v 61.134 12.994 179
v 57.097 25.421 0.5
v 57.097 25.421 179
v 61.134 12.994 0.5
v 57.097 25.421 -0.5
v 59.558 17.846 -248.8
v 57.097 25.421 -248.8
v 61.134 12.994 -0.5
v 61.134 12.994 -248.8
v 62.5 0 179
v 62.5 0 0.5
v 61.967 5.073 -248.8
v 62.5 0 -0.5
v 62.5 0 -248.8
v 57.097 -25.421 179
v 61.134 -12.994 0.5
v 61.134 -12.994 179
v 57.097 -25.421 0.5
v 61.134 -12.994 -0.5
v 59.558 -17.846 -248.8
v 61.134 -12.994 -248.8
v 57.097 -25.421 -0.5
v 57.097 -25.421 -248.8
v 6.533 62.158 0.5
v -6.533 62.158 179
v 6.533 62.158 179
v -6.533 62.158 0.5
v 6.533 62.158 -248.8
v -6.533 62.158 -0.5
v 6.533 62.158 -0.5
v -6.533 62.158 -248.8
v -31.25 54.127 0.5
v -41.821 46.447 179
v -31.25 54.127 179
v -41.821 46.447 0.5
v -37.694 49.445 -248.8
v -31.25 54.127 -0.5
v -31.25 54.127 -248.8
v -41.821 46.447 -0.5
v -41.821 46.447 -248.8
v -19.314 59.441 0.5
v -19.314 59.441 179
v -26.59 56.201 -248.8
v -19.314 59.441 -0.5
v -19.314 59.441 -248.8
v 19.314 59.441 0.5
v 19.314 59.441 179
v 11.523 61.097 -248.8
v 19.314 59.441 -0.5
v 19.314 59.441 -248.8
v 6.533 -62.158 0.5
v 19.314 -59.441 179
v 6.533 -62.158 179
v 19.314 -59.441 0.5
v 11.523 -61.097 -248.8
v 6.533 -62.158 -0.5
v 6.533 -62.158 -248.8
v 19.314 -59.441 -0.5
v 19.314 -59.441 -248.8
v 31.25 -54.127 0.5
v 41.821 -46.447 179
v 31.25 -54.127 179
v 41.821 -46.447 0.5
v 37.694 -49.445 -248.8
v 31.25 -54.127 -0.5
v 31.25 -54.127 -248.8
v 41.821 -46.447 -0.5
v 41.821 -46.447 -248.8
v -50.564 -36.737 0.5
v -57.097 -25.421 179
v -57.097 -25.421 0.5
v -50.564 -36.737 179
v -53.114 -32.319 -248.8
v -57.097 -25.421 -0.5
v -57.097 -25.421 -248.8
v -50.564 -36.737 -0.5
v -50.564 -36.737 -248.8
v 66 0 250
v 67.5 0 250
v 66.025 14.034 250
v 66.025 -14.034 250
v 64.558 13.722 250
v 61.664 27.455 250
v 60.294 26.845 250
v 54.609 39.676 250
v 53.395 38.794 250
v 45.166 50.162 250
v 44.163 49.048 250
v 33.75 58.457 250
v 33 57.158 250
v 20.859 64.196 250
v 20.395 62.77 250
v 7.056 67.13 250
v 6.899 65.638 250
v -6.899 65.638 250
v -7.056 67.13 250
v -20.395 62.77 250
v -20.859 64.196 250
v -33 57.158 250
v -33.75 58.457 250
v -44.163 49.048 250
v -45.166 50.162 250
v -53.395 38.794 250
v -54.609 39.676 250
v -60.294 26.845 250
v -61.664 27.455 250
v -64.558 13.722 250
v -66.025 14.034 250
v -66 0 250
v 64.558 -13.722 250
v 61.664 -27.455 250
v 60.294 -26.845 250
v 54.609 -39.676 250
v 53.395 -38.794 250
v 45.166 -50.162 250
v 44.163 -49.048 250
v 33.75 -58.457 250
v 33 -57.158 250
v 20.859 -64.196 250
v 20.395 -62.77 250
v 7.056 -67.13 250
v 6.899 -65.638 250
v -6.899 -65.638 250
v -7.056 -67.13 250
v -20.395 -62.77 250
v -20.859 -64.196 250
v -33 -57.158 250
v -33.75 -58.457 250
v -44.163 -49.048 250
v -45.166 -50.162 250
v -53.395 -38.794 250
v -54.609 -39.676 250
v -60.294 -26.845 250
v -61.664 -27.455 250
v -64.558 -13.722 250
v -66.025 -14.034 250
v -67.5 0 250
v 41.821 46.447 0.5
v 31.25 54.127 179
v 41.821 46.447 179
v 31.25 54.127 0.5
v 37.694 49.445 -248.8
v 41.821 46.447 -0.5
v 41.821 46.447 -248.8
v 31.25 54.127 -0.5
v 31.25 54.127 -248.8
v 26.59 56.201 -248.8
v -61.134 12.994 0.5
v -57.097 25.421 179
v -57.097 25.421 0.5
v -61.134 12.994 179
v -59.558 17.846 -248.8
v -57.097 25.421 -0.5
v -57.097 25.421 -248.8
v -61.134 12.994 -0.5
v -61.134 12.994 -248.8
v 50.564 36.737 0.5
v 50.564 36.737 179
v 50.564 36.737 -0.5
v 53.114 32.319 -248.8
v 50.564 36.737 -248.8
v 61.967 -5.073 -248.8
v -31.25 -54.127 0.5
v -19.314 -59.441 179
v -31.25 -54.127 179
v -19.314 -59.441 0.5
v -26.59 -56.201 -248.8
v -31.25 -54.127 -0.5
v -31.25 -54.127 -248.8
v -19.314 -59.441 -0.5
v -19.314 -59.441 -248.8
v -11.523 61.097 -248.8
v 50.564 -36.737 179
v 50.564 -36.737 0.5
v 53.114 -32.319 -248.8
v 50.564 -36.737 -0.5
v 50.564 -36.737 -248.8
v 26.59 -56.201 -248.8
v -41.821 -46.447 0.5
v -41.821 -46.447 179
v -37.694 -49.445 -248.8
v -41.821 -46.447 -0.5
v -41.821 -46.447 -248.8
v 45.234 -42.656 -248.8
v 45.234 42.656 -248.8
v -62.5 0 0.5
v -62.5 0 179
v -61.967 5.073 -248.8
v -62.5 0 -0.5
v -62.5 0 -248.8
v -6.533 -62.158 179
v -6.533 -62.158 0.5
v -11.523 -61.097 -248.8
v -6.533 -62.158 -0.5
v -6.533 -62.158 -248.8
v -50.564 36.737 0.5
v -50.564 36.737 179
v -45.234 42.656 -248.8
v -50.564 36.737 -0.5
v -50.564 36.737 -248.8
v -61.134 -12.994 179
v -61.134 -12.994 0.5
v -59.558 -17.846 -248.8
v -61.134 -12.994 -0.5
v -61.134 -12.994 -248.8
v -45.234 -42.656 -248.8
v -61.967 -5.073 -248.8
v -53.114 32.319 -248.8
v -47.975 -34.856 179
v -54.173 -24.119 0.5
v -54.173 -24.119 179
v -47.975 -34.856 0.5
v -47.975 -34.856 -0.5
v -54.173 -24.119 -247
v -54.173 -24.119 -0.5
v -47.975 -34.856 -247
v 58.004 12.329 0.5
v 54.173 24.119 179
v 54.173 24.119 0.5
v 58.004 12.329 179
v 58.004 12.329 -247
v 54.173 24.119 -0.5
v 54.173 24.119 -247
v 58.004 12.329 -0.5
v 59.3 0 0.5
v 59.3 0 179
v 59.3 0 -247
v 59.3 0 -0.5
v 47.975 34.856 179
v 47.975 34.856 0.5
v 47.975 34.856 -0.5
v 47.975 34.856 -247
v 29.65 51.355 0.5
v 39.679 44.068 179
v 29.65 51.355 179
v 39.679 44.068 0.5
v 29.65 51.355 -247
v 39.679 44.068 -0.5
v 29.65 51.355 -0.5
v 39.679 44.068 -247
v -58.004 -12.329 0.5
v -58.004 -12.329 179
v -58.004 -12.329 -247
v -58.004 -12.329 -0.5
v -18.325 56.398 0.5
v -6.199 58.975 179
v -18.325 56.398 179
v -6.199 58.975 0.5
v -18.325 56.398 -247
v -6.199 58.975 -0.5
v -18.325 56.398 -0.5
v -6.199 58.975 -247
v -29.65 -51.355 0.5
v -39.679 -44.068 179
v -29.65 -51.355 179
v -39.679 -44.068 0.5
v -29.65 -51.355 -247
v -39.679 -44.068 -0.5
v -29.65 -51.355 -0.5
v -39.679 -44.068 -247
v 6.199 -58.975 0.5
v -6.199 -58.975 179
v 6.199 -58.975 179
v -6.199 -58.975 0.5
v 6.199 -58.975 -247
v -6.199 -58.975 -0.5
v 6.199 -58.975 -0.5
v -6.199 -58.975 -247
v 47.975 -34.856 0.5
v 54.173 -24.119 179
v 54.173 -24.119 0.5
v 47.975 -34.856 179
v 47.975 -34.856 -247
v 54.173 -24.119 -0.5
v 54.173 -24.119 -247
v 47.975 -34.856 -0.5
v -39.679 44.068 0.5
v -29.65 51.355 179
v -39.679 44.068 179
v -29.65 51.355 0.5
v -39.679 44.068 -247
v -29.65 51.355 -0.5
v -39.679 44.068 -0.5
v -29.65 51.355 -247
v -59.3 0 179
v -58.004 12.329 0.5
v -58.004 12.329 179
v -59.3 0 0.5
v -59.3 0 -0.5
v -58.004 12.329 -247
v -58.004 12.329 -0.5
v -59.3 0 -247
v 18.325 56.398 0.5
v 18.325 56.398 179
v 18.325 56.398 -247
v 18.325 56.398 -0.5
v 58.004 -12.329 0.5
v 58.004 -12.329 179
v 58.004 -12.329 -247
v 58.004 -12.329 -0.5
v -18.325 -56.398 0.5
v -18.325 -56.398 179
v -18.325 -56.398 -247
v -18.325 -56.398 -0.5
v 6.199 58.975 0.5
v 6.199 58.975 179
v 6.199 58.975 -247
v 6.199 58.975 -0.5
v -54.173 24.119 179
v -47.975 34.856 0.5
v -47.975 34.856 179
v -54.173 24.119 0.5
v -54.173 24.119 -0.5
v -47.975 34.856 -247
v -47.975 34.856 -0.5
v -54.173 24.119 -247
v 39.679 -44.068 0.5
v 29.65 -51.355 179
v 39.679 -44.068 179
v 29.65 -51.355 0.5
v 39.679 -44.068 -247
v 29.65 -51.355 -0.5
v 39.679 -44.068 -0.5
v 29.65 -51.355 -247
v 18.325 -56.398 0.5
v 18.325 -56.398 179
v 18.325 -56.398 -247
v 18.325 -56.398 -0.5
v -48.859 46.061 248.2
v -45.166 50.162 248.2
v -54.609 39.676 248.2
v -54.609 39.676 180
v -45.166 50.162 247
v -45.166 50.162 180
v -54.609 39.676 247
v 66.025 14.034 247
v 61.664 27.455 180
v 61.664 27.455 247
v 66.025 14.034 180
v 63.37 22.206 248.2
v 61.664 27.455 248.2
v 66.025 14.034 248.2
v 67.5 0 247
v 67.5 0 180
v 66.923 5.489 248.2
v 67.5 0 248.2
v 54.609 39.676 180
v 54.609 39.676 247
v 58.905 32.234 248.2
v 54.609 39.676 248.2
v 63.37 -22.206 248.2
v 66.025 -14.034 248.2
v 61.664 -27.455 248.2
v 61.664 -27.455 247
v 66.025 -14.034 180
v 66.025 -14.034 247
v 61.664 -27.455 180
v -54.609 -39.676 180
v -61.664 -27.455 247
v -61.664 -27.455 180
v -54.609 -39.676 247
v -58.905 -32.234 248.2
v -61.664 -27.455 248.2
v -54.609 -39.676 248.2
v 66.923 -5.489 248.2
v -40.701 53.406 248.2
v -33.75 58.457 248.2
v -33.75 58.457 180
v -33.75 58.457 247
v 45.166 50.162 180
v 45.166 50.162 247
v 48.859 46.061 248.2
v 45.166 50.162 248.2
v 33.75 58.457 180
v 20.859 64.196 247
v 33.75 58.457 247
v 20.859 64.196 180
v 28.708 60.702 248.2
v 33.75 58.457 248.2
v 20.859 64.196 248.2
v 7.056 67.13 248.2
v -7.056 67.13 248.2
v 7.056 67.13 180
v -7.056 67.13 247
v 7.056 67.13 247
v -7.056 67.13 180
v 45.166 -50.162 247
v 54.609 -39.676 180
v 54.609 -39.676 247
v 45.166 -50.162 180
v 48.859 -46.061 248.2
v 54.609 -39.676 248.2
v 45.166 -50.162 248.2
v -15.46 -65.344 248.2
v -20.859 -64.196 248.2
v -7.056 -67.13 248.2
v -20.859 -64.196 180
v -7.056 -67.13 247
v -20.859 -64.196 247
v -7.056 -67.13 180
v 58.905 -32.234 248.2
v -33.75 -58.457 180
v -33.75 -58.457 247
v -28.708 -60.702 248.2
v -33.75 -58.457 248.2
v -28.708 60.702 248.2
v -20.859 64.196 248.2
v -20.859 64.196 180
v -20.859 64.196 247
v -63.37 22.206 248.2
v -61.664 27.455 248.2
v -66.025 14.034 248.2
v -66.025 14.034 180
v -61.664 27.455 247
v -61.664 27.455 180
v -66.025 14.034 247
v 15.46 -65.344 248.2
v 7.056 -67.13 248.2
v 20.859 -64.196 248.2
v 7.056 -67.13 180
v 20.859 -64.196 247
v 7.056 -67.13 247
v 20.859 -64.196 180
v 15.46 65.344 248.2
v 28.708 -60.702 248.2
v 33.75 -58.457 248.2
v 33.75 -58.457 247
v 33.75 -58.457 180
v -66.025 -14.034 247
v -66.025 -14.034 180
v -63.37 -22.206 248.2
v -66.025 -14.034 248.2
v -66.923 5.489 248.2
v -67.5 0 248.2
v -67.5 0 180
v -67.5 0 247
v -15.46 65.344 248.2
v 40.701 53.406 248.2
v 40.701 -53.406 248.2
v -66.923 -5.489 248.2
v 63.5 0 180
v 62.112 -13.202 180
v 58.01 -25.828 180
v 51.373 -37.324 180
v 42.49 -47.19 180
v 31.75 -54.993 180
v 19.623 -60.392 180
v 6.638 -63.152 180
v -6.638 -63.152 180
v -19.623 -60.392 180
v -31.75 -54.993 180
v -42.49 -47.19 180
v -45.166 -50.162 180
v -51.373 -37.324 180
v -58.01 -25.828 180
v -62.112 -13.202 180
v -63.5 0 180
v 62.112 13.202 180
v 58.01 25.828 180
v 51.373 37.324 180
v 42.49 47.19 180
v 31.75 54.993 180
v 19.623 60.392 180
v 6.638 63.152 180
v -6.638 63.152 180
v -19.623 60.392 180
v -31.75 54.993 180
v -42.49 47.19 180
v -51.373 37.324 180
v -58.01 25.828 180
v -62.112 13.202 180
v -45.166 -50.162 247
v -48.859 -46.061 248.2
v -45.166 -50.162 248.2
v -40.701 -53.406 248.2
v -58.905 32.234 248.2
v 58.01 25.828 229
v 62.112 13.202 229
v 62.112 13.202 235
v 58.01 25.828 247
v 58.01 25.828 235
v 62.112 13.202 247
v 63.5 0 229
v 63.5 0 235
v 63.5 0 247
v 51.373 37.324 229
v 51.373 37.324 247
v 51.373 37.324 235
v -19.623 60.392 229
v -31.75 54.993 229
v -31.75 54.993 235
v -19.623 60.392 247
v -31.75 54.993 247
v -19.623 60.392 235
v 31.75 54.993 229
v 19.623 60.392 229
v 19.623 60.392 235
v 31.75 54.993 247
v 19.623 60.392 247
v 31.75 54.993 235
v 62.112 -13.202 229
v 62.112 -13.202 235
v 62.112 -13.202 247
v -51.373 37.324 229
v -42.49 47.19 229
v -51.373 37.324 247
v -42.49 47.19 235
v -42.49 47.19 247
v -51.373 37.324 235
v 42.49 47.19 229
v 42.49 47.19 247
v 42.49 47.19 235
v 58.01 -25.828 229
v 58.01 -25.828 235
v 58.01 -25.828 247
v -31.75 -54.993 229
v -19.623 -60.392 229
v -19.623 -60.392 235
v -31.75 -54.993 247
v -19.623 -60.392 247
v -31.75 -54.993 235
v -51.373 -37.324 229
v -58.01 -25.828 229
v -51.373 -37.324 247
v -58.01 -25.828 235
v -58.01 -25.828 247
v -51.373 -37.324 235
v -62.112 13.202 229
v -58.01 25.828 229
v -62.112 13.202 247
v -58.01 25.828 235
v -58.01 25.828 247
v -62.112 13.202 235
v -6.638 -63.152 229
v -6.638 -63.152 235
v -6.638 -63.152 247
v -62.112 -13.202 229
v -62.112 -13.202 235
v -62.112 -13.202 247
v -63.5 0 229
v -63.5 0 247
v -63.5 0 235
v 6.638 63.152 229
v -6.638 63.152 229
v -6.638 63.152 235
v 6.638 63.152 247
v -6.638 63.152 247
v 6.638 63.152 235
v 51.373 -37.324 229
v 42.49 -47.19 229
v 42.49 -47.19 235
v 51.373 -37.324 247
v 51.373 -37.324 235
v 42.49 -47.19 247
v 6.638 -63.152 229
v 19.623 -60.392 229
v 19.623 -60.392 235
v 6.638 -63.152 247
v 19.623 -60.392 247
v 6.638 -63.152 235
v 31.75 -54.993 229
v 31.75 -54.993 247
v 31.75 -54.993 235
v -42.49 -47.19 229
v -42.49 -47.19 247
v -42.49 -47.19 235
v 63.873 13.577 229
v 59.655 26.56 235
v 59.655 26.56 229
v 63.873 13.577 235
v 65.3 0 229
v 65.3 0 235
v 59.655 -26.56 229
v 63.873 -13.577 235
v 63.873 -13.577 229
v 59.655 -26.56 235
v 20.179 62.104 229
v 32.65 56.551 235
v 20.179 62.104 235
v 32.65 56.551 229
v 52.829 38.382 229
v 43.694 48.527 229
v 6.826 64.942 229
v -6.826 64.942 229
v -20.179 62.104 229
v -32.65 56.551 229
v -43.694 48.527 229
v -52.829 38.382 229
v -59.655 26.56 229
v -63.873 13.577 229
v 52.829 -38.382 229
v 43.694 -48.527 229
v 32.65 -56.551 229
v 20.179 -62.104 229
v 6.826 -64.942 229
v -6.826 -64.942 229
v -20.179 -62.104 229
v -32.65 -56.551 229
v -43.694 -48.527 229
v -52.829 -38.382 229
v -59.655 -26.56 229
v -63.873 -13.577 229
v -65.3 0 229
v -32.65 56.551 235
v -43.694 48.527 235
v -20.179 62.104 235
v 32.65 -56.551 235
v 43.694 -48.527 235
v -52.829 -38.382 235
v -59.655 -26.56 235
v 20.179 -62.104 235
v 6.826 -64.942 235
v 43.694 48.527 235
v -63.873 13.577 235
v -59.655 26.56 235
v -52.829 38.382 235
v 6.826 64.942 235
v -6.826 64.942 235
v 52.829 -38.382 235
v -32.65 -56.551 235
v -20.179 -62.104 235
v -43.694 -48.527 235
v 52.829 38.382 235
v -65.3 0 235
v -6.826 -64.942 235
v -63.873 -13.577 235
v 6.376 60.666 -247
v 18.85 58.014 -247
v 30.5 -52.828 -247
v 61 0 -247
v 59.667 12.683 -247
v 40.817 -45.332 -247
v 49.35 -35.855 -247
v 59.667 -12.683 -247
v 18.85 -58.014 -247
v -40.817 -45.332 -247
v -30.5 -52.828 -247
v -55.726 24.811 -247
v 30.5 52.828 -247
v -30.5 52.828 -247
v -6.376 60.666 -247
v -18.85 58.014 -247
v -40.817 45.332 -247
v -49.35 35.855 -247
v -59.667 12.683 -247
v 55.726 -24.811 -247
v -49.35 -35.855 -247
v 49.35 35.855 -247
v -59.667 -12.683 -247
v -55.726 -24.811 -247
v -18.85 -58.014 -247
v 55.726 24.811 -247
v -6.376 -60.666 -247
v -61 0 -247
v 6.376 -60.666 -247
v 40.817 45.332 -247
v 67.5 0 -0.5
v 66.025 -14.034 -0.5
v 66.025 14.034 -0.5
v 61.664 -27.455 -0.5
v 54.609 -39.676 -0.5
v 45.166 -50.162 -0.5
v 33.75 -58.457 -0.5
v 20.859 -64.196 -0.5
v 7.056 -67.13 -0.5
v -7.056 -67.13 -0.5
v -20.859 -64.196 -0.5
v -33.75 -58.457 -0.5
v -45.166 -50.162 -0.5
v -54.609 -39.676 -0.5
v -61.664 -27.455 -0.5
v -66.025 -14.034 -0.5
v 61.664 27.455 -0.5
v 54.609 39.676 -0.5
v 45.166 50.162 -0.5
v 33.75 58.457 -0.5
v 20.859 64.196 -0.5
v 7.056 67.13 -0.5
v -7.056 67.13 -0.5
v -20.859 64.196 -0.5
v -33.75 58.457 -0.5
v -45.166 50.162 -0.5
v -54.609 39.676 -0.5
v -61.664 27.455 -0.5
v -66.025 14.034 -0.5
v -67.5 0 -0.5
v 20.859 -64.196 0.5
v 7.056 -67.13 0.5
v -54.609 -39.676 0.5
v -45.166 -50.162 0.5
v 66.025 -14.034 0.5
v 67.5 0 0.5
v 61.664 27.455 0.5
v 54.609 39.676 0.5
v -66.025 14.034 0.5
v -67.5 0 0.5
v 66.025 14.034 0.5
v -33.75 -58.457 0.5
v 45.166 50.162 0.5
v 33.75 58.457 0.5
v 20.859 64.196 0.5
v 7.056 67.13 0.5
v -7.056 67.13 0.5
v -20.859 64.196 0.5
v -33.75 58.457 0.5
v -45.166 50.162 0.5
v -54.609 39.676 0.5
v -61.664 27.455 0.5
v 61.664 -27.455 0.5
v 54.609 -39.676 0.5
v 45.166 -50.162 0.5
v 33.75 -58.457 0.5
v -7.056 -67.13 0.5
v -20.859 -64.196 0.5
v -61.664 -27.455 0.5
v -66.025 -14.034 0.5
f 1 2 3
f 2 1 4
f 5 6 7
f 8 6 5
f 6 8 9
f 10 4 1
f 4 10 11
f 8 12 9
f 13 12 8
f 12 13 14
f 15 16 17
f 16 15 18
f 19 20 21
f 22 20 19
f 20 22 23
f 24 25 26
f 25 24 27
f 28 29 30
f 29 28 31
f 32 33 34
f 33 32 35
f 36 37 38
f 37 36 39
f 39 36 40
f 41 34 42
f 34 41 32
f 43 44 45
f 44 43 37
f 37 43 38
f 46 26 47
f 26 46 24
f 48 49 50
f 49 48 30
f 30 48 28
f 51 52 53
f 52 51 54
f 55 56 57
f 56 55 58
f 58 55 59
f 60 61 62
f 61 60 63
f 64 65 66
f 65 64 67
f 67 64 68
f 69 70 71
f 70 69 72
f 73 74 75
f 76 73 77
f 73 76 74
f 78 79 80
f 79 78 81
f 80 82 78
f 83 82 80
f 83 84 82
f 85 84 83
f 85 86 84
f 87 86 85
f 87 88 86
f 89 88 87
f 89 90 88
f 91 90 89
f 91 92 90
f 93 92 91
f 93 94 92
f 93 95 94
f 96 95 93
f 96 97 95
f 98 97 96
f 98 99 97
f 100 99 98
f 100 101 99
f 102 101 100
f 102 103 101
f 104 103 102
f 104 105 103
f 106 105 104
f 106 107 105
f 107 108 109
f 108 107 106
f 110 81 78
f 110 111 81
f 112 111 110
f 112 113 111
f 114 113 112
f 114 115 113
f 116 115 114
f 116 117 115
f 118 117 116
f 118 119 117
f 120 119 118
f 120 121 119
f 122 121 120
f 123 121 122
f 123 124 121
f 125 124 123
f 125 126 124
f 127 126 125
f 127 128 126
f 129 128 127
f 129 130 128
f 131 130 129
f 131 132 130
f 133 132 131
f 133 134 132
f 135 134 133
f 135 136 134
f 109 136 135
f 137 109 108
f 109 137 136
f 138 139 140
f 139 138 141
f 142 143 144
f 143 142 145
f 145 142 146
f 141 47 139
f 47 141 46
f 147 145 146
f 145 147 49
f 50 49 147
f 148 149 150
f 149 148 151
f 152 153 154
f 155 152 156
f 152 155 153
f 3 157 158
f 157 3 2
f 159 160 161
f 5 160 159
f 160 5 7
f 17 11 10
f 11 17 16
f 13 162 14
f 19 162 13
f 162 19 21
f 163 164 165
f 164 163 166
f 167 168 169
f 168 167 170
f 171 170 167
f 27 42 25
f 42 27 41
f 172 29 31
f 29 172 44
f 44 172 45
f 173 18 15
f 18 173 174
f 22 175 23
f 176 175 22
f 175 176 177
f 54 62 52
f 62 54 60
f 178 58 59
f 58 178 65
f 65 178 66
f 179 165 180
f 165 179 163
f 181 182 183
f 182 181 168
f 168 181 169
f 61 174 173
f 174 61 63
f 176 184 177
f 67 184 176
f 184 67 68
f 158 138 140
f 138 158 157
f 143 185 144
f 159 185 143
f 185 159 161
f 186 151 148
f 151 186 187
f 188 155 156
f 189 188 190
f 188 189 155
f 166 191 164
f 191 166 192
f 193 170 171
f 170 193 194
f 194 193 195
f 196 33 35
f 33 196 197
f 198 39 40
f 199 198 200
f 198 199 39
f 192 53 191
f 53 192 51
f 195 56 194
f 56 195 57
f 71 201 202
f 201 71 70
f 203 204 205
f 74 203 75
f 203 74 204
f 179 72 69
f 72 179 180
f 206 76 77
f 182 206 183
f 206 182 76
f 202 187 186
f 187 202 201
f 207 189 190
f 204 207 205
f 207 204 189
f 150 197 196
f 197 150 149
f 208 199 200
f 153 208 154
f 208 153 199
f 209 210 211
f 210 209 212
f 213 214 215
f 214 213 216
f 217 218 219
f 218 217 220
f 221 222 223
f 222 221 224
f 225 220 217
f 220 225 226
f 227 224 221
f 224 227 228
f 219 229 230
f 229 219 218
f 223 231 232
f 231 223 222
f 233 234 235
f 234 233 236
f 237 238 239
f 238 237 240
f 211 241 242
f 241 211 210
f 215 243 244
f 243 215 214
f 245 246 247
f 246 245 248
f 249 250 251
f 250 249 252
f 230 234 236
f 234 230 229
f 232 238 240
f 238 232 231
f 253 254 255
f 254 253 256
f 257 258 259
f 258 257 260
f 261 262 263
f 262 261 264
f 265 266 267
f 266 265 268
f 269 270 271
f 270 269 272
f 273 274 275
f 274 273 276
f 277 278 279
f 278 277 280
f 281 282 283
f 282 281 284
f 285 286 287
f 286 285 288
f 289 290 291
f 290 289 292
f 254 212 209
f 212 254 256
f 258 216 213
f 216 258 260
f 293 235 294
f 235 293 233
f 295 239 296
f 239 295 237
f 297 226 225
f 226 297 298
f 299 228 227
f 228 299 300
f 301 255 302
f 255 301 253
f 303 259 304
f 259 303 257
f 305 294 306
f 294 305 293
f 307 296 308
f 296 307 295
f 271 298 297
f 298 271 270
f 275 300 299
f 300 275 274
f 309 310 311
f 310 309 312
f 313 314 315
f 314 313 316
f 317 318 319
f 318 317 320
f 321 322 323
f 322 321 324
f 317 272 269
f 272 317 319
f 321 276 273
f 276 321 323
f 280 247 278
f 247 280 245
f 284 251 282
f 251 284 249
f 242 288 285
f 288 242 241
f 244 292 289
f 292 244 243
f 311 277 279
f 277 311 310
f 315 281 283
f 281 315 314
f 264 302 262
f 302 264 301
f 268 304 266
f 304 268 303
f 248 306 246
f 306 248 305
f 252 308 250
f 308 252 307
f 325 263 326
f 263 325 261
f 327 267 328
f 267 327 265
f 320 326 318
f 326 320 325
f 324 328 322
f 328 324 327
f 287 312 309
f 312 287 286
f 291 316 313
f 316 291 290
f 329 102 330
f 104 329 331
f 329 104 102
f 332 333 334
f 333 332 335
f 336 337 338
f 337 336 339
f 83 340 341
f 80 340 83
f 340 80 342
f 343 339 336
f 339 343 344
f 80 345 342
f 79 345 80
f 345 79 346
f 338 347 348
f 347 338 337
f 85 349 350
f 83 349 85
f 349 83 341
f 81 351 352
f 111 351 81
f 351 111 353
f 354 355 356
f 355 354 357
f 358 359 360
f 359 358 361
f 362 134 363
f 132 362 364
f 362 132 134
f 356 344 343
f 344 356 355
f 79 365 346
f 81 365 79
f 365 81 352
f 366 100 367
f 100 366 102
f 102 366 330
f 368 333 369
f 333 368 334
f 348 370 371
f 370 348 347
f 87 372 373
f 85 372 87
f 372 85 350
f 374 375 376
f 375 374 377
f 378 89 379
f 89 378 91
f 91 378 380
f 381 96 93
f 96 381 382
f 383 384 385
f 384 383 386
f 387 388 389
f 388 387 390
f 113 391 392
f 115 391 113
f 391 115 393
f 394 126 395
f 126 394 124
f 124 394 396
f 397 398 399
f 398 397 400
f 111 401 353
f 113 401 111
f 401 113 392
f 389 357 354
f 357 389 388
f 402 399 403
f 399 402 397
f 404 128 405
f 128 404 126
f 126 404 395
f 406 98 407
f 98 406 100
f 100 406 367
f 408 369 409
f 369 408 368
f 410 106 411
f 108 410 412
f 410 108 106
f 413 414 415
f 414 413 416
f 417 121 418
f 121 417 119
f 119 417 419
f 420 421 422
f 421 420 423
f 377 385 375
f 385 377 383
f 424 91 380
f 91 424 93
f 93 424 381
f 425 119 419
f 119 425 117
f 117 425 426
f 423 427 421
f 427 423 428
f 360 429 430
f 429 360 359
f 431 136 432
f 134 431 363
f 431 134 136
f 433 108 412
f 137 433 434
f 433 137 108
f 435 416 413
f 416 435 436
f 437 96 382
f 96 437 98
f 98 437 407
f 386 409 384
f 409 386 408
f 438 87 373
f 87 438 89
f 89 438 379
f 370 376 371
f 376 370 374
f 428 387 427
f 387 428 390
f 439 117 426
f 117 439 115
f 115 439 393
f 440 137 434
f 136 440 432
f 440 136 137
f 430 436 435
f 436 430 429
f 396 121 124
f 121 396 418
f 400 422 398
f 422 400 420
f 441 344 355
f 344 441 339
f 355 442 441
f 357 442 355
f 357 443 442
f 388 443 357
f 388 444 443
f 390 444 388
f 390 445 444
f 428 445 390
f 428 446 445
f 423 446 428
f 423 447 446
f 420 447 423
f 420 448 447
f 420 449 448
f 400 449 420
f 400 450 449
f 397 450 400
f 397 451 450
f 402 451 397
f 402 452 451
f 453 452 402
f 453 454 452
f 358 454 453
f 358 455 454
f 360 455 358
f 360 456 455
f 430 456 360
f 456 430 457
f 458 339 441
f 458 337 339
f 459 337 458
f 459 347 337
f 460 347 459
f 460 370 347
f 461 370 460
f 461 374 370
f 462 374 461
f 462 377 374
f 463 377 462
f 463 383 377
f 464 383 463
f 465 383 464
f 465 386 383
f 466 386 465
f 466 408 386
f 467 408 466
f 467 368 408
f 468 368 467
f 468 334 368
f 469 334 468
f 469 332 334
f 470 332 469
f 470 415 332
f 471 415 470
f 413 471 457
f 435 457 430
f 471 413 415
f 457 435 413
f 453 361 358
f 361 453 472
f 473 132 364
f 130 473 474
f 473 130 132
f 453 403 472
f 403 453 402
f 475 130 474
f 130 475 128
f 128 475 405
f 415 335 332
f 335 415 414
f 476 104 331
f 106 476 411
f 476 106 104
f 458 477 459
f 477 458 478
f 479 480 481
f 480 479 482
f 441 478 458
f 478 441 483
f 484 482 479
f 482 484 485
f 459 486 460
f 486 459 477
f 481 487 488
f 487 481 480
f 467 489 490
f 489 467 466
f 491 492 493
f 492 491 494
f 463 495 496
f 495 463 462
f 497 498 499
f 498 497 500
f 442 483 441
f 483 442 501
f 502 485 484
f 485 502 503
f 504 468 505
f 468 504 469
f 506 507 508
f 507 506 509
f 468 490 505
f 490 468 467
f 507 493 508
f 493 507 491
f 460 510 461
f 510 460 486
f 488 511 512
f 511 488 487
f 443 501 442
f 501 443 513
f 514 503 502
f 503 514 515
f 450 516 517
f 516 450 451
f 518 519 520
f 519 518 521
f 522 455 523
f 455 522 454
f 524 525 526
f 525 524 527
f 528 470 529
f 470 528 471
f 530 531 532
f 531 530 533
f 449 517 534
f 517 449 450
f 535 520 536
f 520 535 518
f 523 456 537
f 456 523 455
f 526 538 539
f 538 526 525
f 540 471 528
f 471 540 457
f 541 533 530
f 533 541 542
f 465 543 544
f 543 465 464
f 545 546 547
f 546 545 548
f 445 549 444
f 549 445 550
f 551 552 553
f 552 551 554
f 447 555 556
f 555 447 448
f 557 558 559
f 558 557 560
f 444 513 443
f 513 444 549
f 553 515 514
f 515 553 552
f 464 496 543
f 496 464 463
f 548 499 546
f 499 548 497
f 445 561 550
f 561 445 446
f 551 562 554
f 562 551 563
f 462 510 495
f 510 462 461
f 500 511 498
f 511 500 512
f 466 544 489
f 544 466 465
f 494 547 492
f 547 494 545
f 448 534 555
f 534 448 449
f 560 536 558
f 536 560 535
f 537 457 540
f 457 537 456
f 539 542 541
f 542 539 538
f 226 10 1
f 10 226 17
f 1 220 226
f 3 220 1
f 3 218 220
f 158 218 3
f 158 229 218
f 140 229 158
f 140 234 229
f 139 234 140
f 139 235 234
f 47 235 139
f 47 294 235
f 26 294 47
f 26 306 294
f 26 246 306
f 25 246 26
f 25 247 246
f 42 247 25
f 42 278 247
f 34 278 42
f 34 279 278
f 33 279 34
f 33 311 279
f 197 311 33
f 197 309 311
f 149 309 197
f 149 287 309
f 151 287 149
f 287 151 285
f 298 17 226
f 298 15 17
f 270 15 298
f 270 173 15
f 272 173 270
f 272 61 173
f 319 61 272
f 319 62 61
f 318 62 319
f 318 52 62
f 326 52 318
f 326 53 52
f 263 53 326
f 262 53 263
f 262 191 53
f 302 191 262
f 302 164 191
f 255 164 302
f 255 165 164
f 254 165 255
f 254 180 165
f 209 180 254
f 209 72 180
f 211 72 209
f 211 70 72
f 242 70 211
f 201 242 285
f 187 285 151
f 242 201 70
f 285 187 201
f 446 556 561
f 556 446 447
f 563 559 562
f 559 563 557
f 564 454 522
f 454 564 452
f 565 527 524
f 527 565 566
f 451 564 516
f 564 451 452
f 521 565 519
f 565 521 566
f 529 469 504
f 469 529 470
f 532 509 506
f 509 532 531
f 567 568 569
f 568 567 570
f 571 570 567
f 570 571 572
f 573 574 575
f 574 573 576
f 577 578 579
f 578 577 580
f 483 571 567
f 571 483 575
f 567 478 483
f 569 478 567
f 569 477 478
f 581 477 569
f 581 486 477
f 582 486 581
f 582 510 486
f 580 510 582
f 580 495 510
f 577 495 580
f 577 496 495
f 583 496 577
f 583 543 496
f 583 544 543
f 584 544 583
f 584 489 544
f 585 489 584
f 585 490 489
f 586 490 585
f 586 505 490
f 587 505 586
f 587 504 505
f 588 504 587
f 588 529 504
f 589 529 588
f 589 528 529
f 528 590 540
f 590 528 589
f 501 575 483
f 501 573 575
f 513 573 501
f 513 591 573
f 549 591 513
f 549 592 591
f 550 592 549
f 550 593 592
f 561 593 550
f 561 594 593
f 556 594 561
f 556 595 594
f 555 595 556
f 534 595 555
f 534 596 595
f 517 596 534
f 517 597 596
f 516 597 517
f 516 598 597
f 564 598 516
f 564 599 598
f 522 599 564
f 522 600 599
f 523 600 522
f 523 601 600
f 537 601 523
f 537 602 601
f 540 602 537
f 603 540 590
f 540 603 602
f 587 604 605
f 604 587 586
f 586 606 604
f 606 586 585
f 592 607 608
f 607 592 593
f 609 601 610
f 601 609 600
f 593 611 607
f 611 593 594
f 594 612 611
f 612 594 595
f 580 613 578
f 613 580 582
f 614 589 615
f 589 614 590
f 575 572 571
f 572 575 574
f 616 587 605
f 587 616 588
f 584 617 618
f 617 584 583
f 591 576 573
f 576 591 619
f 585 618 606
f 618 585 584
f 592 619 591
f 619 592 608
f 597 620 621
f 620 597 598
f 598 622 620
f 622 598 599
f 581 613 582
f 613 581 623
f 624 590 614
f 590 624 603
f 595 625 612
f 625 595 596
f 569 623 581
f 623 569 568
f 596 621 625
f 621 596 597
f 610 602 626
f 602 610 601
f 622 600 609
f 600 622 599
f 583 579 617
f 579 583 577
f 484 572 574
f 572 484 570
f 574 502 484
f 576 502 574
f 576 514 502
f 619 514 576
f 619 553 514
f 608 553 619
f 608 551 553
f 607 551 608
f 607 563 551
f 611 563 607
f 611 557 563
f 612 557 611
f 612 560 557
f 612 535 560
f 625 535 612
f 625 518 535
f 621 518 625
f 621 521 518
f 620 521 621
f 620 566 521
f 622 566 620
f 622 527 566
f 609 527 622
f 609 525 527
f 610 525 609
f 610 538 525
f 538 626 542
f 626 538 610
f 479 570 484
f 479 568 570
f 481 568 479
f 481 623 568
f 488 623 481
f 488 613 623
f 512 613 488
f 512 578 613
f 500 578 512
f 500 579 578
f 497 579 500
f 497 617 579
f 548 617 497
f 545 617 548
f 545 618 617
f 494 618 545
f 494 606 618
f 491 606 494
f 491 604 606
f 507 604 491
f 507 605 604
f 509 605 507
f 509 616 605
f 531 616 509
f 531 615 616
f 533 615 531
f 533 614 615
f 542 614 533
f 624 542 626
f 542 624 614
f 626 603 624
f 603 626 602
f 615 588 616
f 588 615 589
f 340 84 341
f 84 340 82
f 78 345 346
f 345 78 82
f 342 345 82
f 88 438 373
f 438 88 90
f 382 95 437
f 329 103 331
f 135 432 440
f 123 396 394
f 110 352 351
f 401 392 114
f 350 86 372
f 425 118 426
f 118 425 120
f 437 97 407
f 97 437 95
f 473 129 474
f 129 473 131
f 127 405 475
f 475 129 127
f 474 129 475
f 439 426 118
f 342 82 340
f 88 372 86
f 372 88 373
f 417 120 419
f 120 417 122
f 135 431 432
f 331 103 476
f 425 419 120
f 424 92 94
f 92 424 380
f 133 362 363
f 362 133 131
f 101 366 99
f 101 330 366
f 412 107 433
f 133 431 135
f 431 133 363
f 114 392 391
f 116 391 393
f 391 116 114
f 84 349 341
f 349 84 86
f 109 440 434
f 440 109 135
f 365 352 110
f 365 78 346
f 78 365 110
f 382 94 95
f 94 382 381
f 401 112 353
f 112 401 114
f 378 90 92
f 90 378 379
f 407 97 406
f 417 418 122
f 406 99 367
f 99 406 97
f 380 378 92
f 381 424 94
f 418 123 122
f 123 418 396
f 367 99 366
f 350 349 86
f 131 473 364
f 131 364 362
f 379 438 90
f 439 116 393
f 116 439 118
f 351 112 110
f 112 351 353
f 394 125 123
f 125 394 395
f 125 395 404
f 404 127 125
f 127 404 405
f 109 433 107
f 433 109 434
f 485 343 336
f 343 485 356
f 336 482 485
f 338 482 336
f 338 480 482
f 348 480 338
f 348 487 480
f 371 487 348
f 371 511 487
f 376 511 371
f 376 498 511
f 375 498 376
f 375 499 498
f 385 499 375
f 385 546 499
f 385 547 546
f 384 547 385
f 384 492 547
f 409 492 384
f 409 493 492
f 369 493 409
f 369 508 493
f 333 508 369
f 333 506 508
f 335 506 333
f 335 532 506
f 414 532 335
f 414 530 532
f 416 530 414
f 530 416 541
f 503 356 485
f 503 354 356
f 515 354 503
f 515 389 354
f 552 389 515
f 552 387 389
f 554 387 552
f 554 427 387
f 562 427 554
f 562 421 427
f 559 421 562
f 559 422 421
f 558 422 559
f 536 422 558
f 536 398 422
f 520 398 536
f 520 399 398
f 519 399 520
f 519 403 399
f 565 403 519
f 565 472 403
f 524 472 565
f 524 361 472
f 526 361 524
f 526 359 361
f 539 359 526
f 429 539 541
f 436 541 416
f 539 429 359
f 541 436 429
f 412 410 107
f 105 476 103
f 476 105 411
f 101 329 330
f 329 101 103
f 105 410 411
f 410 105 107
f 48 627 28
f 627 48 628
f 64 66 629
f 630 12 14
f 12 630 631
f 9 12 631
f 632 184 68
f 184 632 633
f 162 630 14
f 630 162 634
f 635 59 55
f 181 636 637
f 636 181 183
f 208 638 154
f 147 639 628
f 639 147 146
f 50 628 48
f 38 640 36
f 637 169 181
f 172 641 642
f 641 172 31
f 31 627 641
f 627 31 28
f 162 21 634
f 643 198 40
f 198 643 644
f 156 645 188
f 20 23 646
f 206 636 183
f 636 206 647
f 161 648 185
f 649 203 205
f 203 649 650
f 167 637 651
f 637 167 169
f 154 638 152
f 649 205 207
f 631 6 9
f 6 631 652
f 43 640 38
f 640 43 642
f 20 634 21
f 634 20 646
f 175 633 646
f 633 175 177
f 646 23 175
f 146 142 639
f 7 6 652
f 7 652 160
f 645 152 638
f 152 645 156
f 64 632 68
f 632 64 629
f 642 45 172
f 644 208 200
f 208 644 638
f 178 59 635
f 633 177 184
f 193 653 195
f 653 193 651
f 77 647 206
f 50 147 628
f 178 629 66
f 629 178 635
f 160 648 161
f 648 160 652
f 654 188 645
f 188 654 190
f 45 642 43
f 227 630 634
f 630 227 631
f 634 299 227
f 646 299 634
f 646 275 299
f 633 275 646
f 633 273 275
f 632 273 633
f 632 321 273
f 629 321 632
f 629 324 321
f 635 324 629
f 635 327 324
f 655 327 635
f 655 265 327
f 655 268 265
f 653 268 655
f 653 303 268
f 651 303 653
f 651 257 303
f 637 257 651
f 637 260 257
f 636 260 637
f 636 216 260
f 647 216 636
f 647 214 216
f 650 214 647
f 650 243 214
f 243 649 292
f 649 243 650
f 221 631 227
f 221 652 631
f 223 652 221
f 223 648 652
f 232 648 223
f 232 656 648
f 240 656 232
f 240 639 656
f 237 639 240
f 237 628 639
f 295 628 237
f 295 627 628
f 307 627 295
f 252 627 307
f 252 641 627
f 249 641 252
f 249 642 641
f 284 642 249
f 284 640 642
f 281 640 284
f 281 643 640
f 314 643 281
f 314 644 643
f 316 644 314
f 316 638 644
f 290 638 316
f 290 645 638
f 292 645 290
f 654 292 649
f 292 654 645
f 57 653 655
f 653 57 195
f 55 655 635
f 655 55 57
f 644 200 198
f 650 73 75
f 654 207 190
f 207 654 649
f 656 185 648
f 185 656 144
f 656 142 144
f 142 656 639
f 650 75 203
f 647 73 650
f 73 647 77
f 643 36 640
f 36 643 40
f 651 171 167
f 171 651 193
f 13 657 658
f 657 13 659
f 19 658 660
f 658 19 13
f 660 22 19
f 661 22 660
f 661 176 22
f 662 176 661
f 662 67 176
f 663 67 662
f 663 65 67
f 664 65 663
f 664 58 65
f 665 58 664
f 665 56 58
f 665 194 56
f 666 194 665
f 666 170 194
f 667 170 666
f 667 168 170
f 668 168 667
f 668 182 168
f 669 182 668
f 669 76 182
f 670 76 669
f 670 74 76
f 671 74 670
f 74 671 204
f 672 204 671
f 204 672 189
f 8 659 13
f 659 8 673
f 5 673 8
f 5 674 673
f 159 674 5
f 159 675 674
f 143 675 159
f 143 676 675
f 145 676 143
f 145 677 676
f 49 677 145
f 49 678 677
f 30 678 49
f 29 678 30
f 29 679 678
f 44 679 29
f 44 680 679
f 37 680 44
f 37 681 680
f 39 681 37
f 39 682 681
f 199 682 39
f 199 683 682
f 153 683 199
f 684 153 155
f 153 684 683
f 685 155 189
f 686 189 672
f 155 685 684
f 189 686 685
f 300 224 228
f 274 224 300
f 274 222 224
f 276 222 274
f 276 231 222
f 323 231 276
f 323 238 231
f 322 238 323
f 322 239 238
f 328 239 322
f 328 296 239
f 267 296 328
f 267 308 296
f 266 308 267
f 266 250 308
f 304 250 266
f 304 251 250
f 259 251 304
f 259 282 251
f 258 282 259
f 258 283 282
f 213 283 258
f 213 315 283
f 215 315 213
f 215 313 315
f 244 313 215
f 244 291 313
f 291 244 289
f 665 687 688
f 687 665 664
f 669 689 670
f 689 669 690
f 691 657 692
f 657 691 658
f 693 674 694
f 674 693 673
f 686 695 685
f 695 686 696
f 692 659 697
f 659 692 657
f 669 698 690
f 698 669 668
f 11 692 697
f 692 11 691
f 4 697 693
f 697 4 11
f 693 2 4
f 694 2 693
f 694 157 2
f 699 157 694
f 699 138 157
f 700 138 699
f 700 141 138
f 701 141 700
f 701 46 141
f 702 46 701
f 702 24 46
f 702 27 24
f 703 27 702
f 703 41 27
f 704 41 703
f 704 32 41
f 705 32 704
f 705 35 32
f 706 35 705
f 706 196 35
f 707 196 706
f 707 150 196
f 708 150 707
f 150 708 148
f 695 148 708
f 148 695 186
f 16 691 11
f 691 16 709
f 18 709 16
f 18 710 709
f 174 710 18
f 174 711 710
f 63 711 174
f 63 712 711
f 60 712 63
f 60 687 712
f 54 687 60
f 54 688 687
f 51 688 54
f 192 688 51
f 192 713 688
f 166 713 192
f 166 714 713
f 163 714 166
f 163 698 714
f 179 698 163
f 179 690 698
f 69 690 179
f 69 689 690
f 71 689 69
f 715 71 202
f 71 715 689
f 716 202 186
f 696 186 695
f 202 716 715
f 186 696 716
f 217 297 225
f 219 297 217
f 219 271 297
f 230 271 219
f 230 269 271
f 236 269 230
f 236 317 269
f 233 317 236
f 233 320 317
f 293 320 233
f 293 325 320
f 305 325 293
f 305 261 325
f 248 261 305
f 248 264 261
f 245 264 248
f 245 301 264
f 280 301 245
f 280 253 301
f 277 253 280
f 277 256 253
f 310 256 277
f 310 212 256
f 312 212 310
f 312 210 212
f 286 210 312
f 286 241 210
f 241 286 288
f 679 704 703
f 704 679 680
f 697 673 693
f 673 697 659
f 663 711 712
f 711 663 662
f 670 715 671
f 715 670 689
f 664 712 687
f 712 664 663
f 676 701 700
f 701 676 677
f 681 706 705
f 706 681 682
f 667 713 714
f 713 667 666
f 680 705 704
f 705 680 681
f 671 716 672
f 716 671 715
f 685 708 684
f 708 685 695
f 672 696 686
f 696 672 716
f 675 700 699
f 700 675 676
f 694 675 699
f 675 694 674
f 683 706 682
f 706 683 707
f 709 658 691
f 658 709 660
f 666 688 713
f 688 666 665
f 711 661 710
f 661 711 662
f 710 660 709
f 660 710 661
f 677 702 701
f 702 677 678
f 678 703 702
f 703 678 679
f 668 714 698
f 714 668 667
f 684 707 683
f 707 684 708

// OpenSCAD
// Parameters
pipe_length = 500; //[250:1000:1]
outer_diameter = 125; //[62.5:250:0.1]
wall_thickness = 3.2; //[1.6:6.4:0.1]
inner_diameter = 118.6; //[59.3:237.2:0.1]
socket_length = 70; //[35:140:1]
socket_outer_diameter = 135; //[120:170:0.1]
socket_wall_thickness = 4; //[2:8:0.1]
socket_inner_diameter = 127; //[120:150:0.1]
groove_width = 6; //[3:12:0.1]
groove_depth = 1.8; //[0.8:3.5:0.1]
groove_offset_from_end = 18; //[8:40:0.1]
chamfer_length = 3; //[1:8:0.1]
chamfer_radial = 1.5; //[0.5:4:0.1]
overlap = 1; //[0.5:2:0.1]

// Base Shapes
module pipe_outer_body() {
  translate([0, 0, 0])
    cylinder(h=pipe_length, r=outer_diameter/2, center=true);
}

module pipe_inner_bore() {
  translate([0, 0, 0])
    cylinder(h=pipe_length + 2*overlap, r=inner_diameter/2, center=true);
}

module socket_outer_body() {
  translate([0, 0, pipe_length/2 - socket_length/2])
    cylinder(h=socket_length, r=socket_outer_diameter/2, center=true);
}

module socket_inner_bore() {
  translate([0, 0, pipe_length/2 - socket_length/2])
    cylinder(h=socket_length + 2*overlap, r=socket_inner_diameter/2, center=true);
}

module sealing_groove_cutter() {
  translate([0, 0, pipe_length/2 - groove_offset_from_end])
    cylinder(h=groove_width, r=socket_inner_diameter/2 + groove_depth, center=true);
}

module chamfer_socket_outer_cutter() {
  translate([0, 0, pipe_length/2 - chamfer_length/2])
    cylinder(h=chamfer_length, r1=socket_outer_diameter/2 + overlap, r2=socket_outer_diameter/2 - chamfer_radial, center=true);
}

module chamfer_socket_inner_cutter() {
  translate([0, 0, pipe_length/2 - chamfer_length/2])
    cylinder(h=chamfer_length, r1=socket_inner_diameter/2 + chamfer_radial, r2=socket_inner_diameter/2 - overlap, center=true);
}

module chamfer_spigot_outer_cutter() {
  translate([0, 0, -pipe_length/2 + chamfer_length/2])
    cylinder(h=chamfer_length, r1=outer_diameter/2 + overlap, r2=outer_diameter/2 - chamfer_radial, center=true);
}

module chamfer_spigot_inner_cutter() {
  translate([0, 0, -pipe_length/2 + chamfer_length/2])
    cylinder(h=chamfer_length, r1=inner_diameter/2 + chamfer_radial, r2=inner_diameter/2 - overlap, center=true);
}

module end_faces() {
  translate([0, 0, 0])
    cylinder(h=overlap, r=socket_outer_diameter/2, center=true);
}

// Operations
module pipe_shell() {
  difference() {
    pipe_outer_body();
    pipe_inner_bore();
  }
}

module pipe_with_socket_outer() {
  union() {
    pipe_shell();
    socket_outer_body();
  }
}

module pipe_with_socket_hollow() {
  difference() {
    pipe_with_socket_outer();
    socket_inner_bore();
  }
}

module pipe_with_groove() {
  difference() {
    pipe_with_socket_hollow();
    sealing_groove_cutter();
  }
}

module pipe_with_chamfers() {
  difference() {
    pipe_with_groove();
    chamfer_socket_outer_cutter();
    chamfer_socket_inner_cutter();
    chamfer_spigot_outer_cutter();
    chamfer_spigot_inner_cutter();
  }
}

module socket_end() {
  union() {
    pipe_with_chamfers();
    end_faces();
  }
}

// Final Output
color([0.85, 0.85, 0.8]) // Off-white for 3D printed PLA
socket_end();
